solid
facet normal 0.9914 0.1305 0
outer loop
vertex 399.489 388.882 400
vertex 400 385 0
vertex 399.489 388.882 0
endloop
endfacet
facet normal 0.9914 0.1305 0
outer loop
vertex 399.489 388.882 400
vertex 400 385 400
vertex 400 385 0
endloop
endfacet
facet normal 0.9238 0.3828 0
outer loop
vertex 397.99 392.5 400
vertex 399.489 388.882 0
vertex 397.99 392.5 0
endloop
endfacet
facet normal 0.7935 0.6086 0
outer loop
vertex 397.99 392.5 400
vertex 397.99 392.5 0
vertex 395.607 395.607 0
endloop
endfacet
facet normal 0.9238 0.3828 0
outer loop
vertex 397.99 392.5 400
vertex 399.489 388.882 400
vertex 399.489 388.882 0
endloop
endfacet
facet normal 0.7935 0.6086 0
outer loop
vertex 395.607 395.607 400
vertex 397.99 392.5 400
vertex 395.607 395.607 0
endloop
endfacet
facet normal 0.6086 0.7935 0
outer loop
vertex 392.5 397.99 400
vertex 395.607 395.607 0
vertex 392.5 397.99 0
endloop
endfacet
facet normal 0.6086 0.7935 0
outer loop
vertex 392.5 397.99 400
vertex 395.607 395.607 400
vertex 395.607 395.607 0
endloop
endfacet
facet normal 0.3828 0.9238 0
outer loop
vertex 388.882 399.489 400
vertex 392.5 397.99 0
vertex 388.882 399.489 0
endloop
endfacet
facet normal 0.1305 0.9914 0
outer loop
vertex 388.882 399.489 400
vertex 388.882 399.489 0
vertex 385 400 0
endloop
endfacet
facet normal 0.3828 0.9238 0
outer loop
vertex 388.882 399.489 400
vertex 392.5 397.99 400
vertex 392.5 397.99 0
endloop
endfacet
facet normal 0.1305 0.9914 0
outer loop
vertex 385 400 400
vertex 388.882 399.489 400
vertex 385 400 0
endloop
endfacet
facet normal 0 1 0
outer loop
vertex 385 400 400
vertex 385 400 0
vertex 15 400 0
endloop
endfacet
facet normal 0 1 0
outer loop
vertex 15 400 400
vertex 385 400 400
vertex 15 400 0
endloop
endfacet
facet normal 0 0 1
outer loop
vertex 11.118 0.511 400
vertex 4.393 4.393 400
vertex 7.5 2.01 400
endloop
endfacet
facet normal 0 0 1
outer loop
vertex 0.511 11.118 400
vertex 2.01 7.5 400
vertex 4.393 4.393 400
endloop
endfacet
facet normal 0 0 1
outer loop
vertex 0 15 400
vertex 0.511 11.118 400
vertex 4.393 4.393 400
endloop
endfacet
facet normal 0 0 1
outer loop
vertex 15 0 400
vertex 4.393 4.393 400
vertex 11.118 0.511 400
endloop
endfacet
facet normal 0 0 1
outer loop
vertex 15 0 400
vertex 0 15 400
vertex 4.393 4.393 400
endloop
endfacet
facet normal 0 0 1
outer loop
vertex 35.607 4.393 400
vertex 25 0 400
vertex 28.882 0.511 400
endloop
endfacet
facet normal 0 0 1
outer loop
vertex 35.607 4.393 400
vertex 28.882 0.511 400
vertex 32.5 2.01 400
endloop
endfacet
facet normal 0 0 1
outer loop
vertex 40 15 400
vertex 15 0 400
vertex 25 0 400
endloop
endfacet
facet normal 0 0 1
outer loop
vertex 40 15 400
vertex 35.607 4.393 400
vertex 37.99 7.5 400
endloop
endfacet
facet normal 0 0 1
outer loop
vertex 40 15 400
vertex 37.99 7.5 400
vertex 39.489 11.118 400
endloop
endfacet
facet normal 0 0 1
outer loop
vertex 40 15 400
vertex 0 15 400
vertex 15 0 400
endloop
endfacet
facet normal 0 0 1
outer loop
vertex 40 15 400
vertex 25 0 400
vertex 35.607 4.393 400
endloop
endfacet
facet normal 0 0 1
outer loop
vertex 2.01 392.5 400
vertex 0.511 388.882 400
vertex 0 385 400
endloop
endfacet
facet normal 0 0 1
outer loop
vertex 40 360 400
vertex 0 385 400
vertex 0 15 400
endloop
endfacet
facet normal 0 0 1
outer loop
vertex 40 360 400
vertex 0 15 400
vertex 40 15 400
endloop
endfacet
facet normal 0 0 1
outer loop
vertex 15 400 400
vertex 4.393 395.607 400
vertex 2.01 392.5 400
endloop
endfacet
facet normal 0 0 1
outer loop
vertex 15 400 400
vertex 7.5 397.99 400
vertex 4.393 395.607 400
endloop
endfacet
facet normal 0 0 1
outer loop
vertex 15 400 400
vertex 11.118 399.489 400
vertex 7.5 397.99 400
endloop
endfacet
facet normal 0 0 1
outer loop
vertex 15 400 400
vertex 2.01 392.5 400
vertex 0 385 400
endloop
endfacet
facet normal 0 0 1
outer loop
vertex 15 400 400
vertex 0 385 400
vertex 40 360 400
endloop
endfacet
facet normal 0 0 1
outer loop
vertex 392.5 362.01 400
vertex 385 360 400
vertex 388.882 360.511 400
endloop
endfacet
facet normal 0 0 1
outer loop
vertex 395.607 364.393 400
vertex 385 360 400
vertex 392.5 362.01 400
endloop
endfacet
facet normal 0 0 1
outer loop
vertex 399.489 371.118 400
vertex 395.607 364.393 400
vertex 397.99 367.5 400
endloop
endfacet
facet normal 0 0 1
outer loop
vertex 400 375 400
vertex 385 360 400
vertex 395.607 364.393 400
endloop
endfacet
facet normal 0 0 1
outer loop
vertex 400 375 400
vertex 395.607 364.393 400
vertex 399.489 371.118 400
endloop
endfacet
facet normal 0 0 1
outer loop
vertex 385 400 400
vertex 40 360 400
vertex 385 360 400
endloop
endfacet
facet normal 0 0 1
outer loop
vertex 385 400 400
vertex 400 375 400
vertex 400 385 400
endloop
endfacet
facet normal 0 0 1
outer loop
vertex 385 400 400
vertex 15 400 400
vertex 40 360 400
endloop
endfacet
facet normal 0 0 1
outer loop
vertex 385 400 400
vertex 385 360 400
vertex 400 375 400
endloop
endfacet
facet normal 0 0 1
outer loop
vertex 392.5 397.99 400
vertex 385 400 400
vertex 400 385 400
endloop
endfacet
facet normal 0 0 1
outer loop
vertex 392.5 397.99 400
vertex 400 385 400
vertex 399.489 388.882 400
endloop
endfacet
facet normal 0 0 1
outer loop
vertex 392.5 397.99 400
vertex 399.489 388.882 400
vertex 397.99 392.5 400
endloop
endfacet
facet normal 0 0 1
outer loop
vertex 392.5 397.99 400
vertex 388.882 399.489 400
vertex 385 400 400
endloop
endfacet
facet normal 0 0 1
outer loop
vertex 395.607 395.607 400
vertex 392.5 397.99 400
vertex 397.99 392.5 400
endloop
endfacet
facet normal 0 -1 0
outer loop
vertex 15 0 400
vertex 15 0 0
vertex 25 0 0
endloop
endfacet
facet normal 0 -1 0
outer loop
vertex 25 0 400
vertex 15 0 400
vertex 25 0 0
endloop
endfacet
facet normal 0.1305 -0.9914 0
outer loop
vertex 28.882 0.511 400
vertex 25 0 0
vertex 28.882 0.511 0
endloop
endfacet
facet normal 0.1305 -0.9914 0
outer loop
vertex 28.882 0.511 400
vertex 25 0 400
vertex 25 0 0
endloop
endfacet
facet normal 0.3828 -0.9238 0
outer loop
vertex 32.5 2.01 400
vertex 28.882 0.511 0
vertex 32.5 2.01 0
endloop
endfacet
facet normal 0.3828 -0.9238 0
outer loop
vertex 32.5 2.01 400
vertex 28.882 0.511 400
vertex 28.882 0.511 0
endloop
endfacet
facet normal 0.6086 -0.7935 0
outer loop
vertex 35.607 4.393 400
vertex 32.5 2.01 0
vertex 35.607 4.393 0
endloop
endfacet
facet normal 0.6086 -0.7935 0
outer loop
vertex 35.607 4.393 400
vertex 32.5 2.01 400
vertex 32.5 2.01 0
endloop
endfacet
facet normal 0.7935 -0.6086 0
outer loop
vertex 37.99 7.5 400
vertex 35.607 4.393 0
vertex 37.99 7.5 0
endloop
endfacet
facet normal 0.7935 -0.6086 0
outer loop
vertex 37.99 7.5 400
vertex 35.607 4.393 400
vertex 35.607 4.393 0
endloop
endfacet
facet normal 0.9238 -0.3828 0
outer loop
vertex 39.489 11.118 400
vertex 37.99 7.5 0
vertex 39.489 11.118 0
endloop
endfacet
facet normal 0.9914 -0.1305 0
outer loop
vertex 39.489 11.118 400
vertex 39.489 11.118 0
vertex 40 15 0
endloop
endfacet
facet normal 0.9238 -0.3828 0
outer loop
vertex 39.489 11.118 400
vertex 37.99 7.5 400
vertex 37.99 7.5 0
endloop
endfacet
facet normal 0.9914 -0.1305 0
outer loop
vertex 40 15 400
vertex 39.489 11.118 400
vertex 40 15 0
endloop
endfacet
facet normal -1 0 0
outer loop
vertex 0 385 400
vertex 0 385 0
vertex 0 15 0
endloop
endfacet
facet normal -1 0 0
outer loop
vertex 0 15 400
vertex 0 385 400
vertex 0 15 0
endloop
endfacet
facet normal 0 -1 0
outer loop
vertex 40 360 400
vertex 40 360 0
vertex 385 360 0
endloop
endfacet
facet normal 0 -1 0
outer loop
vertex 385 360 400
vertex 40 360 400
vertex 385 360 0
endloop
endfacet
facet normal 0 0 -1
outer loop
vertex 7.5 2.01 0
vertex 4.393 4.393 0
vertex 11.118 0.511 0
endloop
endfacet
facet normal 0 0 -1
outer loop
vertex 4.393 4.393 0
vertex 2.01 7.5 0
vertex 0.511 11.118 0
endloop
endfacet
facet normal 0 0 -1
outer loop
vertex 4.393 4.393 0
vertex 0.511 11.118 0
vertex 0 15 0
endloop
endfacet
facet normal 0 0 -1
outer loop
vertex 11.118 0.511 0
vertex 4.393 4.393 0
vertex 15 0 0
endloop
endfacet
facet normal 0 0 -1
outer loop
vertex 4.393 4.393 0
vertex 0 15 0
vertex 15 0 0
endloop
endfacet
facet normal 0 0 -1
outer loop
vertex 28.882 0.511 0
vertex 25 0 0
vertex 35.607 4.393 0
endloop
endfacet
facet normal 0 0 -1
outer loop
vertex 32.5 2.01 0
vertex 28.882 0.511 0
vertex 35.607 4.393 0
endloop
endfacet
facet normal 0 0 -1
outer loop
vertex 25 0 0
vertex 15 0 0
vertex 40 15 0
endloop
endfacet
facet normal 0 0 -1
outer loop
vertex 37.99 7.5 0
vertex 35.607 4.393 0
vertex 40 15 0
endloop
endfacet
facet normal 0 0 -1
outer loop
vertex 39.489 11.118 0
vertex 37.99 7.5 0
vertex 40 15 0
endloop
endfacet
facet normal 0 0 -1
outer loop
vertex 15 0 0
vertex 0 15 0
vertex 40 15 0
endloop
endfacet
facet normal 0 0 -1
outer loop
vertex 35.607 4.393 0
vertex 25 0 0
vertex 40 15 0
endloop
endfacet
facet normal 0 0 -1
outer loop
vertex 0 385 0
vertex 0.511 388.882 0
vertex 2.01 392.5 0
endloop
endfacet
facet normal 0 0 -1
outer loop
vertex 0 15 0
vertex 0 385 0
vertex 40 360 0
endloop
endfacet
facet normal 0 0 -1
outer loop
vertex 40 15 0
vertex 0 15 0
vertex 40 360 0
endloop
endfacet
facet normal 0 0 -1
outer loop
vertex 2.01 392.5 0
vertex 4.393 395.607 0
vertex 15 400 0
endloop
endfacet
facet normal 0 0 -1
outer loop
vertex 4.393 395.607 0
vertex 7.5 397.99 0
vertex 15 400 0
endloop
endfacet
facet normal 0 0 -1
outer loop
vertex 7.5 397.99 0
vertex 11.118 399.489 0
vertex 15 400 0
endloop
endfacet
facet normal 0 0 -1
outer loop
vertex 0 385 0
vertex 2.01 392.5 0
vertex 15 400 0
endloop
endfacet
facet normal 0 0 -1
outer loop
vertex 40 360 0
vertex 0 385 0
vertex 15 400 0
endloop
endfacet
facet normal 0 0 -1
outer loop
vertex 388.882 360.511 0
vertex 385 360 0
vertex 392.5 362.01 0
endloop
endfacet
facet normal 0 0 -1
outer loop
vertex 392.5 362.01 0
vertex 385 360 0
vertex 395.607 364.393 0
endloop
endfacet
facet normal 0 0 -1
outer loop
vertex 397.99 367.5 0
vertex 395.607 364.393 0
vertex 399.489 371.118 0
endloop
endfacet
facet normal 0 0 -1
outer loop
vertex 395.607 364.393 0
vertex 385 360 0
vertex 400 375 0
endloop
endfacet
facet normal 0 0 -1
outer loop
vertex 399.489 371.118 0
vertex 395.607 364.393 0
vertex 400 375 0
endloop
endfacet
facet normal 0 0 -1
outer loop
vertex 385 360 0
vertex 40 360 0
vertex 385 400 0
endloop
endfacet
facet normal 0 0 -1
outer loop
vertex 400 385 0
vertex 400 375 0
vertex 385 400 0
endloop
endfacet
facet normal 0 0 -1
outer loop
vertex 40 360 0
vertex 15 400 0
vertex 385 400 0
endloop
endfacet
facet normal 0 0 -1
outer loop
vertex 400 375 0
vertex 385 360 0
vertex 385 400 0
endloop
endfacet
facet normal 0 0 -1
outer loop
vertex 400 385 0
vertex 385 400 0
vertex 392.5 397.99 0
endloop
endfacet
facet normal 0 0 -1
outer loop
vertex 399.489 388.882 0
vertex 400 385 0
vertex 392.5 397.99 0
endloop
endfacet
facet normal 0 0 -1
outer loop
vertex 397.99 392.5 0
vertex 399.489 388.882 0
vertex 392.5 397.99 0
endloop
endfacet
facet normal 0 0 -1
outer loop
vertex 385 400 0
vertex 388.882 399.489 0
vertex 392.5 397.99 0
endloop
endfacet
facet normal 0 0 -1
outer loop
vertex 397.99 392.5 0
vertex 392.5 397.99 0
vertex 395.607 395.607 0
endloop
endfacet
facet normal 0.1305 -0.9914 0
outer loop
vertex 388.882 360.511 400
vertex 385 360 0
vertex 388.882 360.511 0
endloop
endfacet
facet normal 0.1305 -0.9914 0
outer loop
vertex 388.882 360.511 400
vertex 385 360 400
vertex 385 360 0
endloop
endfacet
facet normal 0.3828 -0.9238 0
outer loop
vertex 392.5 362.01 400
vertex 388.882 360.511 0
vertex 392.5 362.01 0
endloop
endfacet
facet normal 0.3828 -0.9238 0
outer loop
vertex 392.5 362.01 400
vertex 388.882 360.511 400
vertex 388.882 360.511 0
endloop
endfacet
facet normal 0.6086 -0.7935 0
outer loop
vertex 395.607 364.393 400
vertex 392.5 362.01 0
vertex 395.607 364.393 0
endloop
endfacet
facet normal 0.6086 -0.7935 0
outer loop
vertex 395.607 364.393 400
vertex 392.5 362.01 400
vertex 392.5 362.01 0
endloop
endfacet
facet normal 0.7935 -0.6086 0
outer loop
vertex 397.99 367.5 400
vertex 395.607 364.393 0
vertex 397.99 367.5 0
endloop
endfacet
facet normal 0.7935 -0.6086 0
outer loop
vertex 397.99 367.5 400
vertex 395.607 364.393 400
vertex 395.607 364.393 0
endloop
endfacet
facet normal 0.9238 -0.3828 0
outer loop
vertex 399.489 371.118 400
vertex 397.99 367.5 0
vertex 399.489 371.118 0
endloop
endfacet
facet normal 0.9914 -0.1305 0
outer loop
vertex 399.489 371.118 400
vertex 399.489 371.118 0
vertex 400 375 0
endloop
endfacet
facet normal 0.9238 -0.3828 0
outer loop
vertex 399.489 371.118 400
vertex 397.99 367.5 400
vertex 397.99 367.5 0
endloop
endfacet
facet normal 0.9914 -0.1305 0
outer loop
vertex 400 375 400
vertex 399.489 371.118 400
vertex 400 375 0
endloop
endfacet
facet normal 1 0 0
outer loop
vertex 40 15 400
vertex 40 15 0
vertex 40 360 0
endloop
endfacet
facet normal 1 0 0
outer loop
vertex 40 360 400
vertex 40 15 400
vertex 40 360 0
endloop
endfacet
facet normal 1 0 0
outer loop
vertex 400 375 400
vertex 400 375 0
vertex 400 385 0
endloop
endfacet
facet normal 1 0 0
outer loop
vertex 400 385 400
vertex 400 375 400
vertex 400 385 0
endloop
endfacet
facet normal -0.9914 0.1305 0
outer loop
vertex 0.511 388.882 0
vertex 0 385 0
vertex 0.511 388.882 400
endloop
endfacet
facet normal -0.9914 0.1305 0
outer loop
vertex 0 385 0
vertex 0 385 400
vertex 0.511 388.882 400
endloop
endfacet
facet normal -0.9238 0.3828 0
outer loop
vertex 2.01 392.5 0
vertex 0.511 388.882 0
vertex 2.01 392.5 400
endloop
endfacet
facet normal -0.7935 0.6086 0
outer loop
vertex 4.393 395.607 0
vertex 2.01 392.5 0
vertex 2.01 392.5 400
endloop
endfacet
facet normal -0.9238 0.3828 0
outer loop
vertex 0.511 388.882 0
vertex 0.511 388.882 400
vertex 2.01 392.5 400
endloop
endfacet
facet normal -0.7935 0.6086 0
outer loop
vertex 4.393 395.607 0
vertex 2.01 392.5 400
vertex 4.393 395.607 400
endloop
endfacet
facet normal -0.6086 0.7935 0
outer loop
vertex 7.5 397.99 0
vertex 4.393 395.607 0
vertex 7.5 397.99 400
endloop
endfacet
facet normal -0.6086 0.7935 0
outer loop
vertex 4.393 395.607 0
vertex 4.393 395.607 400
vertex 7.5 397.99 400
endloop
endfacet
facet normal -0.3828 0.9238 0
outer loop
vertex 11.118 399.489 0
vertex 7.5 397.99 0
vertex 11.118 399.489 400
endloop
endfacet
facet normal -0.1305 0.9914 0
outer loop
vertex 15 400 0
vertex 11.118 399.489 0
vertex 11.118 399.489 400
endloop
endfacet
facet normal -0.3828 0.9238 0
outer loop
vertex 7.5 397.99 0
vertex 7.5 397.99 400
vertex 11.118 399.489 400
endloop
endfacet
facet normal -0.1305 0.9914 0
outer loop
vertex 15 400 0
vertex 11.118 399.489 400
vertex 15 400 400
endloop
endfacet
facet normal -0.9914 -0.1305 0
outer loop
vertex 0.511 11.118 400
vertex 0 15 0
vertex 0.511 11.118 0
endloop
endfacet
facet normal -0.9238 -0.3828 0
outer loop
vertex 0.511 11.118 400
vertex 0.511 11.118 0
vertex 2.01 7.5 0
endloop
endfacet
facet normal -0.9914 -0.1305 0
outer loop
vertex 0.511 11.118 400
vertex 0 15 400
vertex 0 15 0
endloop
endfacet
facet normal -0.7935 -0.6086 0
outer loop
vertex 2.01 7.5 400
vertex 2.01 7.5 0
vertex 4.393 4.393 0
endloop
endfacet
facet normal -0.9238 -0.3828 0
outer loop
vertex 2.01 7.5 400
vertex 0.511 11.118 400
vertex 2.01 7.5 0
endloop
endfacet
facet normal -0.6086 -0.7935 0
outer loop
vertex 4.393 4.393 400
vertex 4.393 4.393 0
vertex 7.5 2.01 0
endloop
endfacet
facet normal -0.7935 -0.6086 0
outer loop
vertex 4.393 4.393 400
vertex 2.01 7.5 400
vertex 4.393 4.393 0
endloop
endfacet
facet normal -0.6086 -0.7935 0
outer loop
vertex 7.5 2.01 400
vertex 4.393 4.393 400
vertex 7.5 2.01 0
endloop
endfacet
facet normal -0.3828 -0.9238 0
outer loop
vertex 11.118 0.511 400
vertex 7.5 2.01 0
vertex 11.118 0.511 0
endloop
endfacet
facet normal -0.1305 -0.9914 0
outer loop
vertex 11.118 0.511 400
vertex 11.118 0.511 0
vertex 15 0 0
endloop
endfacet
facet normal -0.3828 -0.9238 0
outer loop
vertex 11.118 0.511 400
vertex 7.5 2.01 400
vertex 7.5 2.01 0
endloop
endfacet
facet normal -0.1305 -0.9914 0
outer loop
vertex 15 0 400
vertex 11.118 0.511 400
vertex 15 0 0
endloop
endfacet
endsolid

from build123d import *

# Parameters (mm, degrees)
F1_DEPTH = 400
F2_R     = 15
F3_R     = 15


with BuildPart() as f1:
    # F0 (on Top) → F1 (new body)
    with BuildSketch(Plane.XY):
        Polygon((0, 400), (0, 0), (40, 0), (40, 360), (400, 360), (400, 400), align=None)
    extrude(amount=F1_DEPTH)

    # F2
    f2_edges = [f1.edges().sort_by_distance(p)[0] for p in [
        (40, 0, 200),
        (0, 0, 200),
        (400, 360, 200),
        (400, 400, 200),
    ]]
    fillet(f2_edges, radius=F2_R)

    # F3
    f3_edges = [f1.edges().sort_by_distance(p)[0] for p in [
        (0, 400, 200),
    ]]
    fillet(f3_edges, radius=F3_R)


solid = f1.part
